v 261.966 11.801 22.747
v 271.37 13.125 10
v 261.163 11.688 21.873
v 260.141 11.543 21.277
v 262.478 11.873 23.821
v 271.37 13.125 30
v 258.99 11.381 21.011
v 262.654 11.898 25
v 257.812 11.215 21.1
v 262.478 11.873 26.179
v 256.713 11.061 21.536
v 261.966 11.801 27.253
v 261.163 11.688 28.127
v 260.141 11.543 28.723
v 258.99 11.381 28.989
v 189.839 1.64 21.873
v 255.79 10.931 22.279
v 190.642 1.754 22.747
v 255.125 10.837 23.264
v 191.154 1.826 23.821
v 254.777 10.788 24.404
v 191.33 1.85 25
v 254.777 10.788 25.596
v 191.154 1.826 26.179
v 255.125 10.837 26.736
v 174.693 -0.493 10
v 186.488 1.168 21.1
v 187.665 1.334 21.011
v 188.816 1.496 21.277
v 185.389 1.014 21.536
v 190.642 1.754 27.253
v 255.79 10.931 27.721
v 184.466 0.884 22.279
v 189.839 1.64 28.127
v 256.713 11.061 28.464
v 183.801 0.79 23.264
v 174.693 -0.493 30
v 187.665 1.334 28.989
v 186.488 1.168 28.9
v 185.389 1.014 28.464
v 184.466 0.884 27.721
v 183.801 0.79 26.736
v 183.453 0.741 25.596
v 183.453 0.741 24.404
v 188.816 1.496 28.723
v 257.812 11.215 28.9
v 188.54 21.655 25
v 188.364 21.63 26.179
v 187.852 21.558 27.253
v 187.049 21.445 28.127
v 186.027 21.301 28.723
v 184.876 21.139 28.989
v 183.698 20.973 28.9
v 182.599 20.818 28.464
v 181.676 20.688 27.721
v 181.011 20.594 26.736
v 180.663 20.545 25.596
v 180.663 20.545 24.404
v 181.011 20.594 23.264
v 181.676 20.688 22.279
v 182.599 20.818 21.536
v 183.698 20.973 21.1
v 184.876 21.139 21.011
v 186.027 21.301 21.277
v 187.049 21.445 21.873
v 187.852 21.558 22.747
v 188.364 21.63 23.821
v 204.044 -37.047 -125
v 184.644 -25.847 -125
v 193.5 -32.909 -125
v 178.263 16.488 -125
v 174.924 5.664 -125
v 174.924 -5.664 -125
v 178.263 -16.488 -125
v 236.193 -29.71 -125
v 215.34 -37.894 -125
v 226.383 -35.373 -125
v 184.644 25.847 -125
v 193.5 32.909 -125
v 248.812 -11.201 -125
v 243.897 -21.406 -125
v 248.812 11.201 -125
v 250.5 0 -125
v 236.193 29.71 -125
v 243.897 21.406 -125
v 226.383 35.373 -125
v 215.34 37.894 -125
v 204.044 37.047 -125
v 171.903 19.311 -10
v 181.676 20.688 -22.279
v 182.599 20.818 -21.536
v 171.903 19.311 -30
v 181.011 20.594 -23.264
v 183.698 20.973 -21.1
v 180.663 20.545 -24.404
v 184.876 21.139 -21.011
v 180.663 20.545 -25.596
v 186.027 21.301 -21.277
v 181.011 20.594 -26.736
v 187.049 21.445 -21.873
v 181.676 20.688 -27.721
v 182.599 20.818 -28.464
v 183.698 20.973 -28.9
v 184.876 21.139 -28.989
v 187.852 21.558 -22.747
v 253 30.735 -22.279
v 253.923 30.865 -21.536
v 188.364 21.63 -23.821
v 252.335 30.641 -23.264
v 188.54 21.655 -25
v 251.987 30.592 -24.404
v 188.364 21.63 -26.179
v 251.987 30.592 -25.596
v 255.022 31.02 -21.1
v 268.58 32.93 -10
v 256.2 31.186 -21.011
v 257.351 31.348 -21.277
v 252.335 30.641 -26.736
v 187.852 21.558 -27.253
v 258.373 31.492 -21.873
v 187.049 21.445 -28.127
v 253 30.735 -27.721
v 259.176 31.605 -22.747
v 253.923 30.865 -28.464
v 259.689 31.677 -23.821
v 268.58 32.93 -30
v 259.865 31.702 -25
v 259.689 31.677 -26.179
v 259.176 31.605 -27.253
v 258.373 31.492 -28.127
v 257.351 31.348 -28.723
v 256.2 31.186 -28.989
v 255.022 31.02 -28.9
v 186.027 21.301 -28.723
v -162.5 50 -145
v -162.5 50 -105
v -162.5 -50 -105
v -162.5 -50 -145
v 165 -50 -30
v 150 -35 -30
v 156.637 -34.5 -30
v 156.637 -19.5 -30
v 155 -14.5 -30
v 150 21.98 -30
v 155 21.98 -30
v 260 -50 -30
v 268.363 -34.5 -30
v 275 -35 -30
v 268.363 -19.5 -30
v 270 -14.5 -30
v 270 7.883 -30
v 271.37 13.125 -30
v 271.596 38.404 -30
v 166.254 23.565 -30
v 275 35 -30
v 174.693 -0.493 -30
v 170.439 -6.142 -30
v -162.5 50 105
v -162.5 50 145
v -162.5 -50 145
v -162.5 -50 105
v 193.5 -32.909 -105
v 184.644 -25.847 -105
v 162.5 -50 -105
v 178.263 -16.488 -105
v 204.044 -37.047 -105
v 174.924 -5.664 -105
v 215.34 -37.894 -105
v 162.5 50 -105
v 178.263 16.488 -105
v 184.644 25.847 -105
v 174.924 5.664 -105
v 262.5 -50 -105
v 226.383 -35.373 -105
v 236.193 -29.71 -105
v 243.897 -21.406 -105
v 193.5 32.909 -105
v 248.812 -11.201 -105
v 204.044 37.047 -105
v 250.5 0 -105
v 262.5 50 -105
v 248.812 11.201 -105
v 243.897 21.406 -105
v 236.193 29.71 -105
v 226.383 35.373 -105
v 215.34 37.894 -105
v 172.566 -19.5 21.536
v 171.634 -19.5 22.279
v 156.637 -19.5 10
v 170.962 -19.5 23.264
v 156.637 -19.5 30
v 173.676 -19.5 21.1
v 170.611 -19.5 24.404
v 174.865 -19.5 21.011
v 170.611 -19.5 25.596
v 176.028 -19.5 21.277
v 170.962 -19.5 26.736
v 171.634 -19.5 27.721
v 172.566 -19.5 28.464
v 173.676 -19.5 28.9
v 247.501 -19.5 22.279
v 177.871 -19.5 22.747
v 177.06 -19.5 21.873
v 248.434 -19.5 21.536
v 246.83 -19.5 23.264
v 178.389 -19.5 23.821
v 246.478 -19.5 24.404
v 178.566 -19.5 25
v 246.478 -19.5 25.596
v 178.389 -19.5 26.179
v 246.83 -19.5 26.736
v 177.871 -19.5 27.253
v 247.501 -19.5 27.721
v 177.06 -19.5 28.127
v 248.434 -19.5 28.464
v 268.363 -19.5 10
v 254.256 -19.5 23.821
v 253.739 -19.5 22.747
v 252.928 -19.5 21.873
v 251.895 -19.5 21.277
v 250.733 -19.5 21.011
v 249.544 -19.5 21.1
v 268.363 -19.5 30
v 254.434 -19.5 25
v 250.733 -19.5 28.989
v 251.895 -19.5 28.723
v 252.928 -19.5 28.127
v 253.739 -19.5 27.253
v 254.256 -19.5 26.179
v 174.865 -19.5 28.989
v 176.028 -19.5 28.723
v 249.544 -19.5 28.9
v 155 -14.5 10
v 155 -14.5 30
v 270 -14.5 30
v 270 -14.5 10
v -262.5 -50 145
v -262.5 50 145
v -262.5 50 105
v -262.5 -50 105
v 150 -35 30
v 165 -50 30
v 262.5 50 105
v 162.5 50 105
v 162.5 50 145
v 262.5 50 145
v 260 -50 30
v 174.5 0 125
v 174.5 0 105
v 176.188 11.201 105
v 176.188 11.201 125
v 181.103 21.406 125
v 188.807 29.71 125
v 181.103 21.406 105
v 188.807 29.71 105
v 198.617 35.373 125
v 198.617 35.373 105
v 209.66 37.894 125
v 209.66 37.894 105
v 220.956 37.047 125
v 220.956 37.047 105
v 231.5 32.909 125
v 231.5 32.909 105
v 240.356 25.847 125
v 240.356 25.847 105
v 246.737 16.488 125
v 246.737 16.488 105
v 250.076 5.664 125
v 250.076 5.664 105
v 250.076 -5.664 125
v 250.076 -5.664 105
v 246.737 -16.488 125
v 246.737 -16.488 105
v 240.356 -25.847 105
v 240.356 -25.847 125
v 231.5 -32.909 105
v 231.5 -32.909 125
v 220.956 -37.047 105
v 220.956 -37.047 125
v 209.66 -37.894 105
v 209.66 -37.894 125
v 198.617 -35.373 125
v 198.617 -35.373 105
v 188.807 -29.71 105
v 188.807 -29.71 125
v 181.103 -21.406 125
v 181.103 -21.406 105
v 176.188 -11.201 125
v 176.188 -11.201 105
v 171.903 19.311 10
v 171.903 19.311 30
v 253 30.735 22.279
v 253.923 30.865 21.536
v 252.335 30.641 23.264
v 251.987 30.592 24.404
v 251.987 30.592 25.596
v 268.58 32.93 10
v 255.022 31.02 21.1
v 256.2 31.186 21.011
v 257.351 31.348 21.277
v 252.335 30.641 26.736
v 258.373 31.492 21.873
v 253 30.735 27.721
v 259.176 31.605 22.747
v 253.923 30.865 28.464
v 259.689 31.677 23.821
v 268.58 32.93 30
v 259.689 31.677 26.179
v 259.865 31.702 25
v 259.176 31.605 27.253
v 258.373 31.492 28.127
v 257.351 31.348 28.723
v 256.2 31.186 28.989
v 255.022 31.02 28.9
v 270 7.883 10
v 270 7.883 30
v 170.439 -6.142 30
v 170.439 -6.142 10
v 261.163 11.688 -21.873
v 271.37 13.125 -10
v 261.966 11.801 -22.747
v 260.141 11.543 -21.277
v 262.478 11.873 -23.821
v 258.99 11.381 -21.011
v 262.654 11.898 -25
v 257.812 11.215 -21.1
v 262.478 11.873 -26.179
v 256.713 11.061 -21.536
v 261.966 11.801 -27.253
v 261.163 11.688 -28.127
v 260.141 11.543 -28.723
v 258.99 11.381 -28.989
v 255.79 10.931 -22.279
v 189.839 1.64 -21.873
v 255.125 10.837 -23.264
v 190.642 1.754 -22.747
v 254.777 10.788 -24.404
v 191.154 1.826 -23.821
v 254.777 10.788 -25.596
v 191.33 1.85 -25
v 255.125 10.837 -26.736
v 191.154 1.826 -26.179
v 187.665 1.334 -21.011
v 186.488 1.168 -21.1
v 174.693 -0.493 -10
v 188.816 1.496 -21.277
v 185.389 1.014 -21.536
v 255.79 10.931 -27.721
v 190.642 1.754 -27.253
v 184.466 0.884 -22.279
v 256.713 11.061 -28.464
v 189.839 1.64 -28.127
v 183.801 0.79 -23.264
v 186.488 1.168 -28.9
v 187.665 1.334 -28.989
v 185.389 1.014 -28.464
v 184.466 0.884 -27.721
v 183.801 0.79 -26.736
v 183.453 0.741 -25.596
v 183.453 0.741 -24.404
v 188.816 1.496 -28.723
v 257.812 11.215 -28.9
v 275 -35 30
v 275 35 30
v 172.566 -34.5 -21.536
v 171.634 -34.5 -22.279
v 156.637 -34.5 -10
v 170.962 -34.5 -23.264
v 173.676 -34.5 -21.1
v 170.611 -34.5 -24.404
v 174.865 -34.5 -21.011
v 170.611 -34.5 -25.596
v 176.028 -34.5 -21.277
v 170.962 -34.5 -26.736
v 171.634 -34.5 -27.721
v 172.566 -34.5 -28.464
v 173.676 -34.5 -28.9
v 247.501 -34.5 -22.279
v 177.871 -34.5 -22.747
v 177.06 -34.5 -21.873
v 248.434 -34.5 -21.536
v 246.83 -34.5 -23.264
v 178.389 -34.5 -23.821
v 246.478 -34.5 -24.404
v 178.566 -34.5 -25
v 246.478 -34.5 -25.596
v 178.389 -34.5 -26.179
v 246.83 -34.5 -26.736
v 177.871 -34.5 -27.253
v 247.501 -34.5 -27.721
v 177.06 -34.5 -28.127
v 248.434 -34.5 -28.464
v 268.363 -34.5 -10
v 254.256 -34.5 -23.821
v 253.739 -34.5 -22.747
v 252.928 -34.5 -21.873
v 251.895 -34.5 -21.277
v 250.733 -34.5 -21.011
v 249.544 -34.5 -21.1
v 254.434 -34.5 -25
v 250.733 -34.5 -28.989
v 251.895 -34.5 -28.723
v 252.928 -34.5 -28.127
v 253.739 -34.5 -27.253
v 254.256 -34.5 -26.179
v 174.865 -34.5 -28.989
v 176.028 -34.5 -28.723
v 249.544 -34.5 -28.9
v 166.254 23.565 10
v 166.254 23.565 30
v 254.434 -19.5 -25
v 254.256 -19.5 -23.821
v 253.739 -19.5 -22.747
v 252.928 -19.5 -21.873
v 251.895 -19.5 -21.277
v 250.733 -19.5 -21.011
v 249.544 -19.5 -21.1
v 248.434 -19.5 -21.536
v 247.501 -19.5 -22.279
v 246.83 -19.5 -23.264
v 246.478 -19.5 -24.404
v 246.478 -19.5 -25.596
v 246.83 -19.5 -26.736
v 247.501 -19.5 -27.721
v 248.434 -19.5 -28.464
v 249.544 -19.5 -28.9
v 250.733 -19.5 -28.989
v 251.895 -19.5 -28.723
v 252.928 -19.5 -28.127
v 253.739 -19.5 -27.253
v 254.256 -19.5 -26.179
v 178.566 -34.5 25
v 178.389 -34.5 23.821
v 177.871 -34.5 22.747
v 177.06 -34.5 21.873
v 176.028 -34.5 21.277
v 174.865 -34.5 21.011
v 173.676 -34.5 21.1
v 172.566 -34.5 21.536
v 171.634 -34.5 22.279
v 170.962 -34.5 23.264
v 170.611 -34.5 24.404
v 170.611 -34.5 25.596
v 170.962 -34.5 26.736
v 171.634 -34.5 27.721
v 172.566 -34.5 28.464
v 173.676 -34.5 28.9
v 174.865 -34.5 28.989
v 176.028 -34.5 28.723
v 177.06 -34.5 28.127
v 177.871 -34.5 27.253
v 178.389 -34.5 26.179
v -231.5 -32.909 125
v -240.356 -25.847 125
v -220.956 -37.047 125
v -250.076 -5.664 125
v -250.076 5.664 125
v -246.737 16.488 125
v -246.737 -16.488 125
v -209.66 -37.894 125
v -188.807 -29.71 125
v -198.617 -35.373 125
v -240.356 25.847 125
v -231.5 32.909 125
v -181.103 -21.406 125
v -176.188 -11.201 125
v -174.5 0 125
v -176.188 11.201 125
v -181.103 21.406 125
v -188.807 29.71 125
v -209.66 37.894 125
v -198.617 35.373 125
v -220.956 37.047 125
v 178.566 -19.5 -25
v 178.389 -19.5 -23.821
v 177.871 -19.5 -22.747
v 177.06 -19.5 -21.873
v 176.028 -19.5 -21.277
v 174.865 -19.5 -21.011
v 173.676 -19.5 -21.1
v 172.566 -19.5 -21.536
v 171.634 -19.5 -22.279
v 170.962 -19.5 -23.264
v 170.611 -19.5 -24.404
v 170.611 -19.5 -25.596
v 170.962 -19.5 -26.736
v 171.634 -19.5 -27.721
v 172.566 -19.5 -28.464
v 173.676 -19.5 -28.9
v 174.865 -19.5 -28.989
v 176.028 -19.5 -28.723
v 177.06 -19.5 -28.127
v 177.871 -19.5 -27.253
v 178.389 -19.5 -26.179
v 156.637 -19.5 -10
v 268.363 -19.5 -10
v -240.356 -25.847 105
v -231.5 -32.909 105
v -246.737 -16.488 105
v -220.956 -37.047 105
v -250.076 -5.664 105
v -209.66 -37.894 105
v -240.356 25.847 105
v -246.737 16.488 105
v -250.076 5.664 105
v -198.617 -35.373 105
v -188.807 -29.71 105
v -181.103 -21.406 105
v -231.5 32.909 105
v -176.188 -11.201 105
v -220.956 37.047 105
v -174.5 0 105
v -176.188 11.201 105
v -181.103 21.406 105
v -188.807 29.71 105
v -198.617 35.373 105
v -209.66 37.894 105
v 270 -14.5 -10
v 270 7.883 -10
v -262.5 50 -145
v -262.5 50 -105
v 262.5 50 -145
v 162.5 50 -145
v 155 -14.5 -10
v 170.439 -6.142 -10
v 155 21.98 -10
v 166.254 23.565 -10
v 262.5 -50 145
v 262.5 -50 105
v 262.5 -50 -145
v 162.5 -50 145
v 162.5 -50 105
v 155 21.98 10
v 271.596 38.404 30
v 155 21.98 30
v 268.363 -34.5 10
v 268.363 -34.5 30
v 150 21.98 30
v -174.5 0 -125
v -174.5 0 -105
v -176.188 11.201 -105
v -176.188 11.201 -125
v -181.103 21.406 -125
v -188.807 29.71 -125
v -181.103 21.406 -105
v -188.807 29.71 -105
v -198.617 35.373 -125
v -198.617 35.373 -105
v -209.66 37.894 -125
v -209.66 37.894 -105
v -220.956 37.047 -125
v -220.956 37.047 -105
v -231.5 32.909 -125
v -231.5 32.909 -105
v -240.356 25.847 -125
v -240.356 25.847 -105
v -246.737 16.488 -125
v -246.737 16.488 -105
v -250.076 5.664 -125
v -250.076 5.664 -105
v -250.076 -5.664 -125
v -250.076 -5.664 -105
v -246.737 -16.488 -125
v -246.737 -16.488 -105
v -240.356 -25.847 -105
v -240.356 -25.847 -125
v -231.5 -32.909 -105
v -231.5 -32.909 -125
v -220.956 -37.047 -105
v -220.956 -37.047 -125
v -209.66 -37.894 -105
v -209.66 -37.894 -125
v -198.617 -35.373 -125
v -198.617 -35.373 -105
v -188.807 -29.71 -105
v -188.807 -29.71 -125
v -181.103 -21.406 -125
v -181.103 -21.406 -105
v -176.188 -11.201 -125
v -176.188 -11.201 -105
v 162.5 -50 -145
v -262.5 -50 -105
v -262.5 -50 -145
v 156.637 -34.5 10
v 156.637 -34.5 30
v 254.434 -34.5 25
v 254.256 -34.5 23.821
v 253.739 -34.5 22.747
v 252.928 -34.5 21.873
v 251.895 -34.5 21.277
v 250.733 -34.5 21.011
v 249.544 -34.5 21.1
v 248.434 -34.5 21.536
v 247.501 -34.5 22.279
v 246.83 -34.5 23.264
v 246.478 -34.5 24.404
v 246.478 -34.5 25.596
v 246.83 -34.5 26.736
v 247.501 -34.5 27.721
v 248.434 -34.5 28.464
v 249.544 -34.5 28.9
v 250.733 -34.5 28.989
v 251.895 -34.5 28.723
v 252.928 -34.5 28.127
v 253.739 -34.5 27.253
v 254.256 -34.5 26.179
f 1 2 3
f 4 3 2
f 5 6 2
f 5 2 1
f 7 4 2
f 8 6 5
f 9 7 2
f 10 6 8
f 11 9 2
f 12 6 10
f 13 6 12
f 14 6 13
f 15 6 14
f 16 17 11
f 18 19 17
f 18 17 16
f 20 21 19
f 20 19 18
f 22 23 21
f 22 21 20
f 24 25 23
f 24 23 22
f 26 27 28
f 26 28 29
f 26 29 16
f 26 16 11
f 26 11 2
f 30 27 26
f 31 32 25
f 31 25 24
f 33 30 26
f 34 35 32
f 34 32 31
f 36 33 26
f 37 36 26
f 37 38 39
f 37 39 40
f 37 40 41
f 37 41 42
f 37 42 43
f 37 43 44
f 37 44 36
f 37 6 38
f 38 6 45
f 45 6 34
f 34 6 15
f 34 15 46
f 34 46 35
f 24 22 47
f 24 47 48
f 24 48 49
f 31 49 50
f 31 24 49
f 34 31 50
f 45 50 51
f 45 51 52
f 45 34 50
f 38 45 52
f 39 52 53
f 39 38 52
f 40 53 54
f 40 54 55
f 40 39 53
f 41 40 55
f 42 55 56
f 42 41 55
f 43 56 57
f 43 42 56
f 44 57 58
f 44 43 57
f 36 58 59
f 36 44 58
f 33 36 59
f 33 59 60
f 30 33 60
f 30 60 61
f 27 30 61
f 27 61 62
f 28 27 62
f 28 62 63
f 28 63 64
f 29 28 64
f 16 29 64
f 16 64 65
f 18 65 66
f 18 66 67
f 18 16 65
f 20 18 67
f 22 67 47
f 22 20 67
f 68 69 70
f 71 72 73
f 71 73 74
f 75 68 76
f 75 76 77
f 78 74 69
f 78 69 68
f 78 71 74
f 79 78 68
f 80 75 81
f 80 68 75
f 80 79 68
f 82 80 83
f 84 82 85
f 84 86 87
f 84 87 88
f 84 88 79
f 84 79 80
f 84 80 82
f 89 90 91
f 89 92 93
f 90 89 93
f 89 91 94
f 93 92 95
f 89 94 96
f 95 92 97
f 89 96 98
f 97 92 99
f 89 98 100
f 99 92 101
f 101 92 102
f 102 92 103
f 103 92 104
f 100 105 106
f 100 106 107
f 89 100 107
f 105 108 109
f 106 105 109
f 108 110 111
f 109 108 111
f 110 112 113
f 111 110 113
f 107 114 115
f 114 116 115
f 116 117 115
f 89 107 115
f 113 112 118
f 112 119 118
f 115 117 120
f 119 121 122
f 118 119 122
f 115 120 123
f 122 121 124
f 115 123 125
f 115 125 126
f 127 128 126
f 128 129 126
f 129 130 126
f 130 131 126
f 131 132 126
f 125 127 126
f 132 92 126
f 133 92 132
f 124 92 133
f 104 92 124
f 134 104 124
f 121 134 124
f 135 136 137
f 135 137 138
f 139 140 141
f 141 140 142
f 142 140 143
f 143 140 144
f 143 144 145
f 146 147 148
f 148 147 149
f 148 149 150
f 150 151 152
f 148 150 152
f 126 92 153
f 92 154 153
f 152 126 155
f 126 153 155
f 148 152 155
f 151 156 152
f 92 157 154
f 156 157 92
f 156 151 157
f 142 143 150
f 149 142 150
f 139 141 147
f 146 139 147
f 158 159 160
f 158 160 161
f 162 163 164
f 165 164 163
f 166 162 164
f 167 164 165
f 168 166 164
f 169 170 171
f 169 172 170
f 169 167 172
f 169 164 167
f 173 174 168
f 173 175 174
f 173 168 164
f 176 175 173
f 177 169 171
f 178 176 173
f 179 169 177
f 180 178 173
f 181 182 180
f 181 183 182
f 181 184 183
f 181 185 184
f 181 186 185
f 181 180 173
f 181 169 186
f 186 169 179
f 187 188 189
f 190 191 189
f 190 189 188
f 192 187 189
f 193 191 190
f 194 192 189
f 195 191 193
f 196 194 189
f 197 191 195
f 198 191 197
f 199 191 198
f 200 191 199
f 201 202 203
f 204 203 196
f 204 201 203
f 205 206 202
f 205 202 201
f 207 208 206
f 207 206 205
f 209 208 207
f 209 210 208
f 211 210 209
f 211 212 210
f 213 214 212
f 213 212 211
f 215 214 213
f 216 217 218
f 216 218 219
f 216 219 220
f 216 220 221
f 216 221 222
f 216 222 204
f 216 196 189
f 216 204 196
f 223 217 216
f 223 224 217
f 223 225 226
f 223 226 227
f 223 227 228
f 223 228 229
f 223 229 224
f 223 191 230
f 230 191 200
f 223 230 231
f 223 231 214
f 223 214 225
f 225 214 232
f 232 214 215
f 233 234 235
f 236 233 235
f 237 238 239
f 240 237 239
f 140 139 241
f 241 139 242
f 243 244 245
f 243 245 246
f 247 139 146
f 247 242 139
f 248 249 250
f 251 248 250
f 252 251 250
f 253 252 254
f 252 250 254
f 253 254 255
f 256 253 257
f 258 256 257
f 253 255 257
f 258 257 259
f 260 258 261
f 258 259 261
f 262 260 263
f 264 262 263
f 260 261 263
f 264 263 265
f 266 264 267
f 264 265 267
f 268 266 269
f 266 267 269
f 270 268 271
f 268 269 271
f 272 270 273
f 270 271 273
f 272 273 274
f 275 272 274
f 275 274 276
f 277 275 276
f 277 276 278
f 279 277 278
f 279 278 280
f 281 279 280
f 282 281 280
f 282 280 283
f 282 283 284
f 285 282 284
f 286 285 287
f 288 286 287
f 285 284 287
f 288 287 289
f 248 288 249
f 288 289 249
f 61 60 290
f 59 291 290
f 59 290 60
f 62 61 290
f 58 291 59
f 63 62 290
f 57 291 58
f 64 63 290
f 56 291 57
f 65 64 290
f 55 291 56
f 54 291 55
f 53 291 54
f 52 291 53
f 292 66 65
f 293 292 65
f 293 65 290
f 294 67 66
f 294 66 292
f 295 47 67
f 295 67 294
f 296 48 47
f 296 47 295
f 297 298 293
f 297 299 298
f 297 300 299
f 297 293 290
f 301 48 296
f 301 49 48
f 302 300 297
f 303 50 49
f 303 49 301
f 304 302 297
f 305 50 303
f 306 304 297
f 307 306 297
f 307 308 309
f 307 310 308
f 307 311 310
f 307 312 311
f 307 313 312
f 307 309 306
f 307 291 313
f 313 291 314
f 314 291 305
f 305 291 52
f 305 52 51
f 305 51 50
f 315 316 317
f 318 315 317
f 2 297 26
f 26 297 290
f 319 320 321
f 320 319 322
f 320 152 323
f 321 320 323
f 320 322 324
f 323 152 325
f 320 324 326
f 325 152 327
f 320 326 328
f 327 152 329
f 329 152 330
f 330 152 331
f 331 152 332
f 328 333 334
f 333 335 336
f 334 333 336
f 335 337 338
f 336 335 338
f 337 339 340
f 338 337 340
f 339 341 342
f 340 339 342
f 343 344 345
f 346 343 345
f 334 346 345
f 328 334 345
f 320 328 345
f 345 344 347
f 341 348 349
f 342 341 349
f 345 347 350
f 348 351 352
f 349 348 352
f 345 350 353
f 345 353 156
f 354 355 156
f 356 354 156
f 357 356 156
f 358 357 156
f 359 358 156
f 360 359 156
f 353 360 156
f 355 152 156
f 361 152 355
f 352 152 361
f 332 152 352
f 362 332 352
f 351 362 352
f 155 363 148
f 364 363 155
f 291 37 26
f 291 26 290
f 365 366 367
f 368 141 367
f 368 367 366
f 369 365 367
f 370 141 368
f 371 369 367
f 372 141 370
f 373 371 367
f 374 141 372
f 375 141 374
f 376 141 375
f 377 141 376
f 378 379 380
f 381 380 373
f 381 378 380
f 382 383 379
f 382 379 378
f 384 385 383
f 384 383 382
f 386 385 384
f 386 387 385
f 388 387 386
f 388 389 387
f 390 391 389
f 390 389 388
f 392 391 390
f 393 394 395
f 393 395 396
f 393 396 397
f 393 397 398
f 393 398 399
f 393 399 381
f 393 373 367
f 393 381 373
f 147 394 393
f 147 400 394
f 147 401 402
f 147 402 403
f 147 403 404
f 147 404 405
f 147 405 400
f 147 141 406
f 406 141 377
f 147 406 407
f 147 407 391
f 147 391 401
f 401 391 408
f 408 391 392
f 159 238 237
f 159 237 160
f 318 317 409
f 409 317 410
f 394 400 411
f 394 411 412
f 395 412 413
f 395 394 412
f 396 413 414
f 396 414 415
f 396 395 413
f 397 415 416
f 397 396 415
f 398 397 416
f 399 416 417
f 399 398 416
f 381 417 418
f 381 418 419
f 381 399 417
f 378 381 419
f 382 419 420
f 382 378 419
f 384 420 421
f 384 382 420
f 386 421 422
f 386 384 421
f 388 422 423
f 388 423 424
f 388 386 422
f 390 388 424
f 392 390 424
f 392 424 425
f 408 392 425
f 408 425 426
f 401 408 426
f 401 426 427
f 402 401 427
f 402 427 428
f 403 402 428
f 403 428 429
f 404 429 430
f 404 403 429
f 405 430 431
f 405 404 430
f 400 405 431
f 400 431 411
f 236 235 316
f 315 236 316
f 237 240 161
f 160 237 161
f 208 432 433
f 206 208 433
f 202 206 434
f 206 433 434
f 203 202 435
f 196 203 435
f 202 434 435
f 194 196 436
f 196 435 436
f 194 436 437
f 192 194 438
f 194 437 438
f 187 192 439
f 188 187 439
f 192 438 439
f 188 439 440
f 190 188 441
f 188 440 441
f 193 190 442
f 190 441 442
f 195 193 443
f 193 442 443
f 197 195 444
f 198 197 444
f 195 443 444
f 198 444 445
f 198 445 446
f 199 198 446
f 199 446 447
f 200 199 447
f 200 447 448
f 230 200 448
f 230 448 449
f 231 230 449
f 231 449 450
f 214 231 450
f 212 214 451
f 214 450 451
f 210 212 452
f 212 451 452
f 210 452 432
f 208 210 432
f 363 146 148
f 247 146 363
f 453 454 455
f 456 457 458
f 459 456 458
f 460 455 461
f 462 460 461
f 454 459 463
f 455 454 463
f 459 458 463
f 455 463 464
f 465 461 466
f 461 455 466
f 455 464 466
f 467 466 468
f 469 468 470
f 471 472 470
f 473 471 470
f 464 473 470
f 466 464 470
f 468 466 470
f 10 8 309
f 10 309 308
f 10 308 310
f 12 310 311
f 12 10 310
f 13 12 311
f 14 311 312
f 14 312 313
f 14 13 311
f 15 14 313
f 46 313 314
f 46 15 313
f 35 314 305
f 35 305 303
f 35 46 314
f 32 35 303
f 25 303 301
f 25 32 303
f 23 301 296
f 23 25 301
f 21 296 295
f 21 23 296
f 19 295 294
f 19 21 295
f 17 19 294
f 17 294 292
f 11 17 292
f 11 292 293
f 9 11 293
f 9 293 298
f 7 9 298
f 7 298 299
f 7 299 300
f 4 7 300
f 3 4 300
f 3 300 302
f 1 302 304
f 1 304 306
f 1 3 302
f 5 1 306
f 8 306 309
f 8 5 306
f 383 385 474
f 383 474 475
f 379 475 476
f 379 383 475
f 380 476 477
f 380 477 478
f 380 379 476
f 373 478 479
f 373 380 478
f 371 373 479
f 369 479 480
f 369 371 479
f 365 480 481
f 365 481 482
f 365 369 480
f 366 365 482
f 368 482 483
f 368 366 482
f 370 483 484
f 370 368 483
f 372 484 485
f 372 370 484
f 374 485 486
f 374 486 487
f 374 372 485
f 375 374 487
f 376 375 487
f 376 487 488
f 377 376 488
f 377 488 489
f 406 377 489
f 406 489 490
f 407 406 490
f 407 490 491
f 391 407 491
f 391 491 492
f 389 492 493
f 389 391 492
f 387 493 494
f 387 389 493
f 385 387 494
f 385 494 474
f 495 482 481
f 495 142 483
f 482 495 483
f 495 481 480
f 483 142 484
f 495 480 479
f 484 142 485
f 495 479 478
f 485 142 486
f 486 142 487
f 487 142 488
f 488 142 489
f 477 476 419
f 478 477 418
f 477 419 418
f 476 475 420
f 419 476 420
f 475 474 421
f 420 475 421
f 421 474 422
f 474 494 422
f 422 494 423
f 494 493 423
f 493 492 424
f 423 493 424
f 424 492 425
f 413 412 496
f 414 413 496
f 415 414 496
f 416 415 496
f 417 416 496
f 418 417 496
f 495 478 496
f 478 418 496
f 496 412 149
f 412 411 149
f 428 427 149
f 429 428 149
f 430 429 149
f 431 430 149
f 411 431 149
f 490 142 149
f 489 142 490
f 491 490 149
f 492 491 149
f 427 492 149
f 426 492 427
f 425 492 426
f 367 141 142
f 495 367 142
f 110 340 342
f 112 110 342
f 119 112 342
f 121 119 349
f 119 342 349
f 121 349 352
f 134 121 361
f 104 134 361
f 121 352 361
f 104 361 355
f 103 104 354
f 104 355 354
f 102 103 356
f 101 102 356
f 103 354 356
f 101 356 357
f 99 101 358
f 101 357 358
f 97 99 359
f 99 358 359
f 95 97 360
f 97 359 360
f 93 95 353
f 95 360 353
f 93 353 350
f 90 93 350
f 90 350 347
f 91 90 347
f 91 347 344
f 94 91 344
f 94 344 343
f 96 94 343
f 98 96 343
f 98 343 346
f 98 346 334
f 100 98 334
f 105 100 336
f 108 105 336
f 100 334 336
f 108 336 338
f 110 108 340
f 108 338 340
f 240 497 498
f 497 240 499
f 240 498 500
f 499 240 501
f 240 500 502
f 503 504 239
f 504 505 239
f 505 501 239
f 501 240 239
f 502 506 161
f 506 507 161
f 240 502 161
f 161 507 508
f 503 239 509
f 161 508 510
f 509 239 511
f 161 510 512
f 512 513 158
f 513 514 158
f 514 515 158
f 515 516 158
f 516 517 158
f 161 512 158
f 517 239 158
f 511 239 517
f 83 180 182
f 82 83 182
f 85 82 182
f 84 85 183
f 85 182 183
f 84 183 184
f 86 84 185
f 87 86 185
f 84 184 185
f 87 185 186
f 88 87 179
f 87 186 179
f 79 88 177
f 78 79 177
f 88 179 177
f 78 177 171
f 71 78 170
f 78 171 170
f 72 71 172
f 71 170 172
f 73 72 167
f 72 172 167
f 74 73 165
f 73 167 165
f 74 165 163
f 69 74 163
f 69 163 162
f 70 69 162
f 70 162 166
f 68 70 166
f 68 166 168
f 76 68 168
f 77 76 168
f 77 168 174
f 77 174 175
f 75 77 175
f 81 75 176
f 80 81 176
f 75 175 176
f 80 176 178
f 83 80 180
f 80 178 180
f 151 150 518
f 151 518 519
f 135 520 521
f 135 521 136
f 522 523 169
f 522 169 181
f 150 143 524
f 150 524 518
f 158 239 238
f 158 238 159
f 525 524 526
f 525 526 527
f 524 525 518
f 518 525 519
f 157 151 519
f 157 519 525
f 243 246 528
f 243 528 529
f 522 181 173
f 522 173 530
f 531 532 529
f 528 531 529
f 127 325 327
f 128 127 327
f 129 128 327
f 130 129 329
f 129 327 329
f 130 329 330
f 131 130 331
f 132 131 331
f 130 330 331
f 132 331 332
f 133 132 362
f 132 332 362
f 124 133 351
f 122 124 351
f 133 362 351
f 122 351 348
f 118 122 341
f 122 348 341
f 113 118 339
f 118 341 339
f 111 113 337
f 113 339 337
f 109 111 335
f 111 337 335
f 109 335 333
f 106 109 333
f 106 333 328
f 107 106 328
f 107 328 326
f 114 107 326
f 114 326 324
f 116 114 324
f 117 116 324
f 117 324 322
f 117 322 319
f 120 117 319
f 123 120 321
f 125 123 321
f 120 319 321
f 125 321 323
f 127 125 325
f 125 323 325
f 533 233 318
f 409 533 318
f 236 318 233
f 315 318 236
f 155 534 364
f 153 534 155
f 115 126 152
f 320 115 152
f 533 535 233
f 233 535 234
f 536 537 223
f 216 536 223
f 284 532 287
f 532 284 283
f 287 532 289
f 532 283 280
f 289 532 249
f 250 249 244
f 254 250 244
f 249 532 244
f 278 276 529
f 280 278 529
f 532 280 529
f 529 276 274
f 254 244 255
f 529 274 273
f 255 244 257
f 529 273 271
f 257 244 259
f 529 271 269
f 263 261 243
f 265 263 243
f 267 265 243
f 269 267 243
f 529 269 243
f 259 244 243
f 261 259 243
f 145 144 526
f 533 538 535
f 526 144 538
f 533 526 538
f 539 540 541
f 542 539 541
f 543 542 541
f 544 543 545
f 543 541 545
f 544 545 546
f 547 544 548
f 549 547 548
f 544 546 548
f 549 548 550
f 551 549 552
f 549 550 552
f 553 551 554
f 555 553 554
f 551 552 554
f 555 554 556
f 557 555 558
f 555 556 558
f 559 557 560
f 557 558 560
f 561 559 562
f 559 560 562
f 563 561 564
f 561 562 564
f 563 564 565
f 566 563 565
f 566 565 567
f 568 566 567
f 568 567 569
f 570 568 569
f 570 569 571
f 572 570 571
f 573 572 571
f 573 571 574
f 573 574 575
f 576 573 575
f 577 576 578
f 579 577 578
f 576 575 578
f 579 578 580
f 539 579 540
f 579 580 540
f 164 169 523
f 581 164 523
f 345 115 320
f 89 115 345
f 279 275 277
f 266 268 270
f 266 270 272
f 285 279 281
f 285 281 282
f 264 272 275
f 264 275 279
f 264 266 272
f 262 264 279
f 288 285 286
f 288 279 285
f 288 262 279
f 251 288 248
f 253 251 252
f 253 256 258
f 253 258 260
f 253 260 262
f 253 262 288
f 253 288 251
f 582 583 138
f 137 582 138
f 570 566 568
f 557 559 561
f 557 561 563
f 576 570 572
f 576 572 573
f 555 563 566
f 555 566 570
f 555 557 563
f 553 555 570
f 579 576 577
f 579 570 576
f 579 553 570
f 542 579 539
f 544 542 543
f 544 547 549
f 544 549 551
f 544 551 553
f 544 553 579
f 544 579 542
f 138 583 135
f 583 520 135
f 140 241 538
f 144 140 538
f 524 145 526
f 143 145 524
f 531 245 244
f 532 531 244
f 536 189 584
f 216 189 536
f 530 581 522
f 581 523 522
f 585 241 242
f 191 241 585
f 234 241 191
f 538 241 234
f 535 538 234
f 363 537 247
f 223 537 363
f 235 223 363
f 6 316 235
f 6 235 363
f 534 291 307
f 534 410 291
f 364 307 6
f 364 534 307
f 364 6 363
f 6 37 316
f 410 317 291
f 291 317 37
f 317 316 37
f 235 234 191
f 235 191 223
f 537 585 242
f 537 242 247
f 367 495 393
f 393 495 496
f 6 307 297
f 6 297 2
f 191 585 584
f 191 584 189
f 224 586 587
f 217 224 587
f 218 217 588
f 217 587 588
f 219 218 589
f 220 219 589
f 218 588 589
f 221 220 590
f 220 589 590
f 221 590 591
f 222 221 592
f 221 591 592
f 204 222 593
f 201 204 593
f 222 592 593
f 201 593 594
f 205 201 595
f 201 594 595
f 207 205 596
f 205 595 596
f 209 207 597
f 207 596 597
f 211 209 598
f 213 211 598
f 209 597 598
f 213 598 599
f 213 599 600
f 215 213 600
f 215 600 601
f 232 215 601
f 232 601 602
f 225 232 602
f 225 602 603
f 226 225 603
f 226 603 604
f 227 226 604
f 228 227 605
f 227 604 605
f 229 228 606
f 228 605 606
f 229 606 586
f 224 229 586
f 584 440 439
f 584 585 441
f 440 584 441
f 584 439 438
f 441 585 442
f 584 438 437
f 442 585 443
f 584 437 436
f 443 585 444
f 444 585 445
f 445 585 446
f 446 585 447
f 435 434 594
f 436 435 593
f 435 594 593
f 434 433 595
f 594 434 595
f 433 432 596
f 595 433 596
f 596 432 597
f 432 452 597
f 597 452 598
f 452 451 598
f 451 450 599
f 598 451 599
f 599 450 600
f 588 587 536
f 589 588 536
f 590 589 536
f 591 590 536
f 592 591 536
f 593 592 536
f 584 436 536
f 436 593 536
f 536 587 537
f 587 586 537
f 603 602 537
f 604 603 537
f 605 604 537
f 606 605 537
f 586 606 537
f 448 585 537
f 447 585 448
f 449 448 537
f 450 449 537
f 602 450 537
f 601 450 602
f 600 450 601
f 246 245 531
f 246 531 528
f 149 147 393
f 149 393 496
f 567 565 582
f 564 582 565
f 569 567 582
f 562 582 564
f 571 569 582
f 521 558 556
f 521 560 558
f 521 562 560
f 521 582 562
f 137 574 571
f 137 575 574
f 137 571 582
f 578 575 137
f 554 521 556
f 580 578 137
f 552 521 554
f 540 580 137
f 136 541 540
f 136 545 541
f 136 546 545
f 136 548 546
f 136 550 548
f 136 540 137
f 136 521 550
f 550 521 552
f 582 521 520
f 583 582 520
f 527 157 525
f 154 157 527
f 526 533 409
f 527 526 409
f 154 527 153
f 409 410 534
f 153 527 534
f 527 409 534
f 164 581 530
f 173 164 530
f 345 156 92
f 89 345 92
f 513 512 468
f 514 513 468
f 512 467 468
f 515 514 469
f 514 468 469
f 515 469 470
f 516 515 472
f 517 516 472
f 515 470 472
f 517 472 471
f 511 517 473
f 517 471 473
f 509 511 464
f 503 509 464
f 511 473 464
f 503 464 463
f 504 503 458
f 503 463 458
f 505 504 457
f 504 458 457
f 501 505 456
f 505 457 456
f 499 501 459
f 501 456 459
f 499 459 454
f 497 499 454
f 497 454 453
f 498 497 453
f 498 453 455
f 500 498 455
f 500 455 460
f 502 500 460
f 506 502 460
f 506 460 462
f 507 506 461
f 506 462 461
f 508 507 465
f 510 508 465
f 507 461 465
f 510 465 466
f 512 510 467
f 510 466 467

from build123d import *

# Parameters (mm, degrees)
SKETCH1_W                = 100
SKETCH1_H                = 40
BOSS_EXTRUDE1_DEPTH      = 50
BOSS_EXTRUDE1_2_DEPTH    = 50
BOSS_EXTRUDE1_3_DEPTH    = 50
BOSS_EXTRUDE1_4_DEPTH    = 50
SKETCH3_R                = 38
CUT_EXTRUDE5_DEPTH       = 20
SKETCH4_R                = 38
CUT_EXTRUDE6_DEPTH       = 20
SKETCH11_W               = 125
SKETCH11_H               = 100
BOSS_EXTRUDE3_DEPTH      = 30
CHAMFER1_SIZE            = 15
SKETCH17_W               = 111.72522046
SKETCH17_H               = 15
CUT_EXTRUDE8_DEPTH       = 20
SKETCH22_R               = 4
BOSS_EXTRUDE5_DEPTH      = 15
CUT_EXTRUDE9_DEPTH       = 20
SKETCH24_R               = 4
BOSS_EXTRUDE7_DEPTH      = 20
CUT_EXTRUDE12_DEPTH      = 60
CUT_EXTRUDE13_DEPTH      = 20
SKETCH29_R               = 38
CUT_EXTRUDE14_DEPTH      = 230
CUT_EXTRUDE14_DEPTH_BACK = 20


with BuildPart() as part:
    # Sketch1 → Boss-Extrude1 (new body, symmetric)
    with BuildSketch(Plane(origin=(0, 0, 0), x_dir=(1, 0, 0), z_dir=(0, 1, 0))):
        with Locations((212.5, 125)):
            Rectangle(SKETCH1_W, SKETCH1_H)
    extrude(amount=BOSS_EXTRUDE1_DEPTH, both=True)

    # Sketch4 → Cut-Extrude6 (cut)
    with BuildSketch(Plane.XY.offset(-105)):
        with Locations((212.5, 0)):
            Circle(SKETCH4_R)
    extrude(amount=-CUT_EXTRUDE6_DEPTH, mode=Mode.SUBTRACT)


with BuildPart() as body_2:
    # Sketch1 → Boss-Extrude1 2 (new body, symmetric)
    with BuildSketch(Plane(origin=(0, 0, 0), x_dir=(1, 0, 0), z_dir=(0, 1, 0))):
        with Locations((212.5, -125)):
            Rectangle(SKETCH1_W, SKETCH1_H)
    extrude(amount=BOSS_EXTRUDE1_2_DEPTH, both=True)

    # Sketch3 → Cut-Extrude5 (cut)
    with BuildSketch(Plane(origin=(0, 0, 105), x_dir=(-1, 0, 0), z_dir=(0, 0, -1))):
        with Locations((-212.5, 0)):
            Circle(SKETCH3_R)
    extrude(amount=-CUT_EXTRUDE5_DEPTH, mode=Mode.SUBTRACT)


with BuildPart() as body_3:
    # Sketch1 → Boss-Extrude1 3 (new body, symmetric)
    with BuildSketch(Plane(origin=(0, 0, 0), x_dir=(1, 0, 0), z_dir=(0, 1, 0))):
        with Locations((-212.5, -125)):
            Rectangle(SKETCH1_W, SKETCH1_H)
    extrude(amount=BOSS_EXTRUDE1_3_DEPTH, both=True)


with BuildPart() as body_4:
    # Sketch1 → Boss-Extrude1 4 (new body, symmetric)
    with BuildSketch(Plane(origin=(0, 0, 0), x_dir=(1, 0, 0), z_dir=(0, 1, 0))):
        with Locations((-212.5, 125)):
            Rectangle(SKETCH1_W, SKETCH1_H)
    extrude(amount=BOSS_EXTRUDE1_4_DEPTH, both=True)


with BuildPart() as body_5:
    # Sketch11 → Boss-Extrude3 (new body, symmetric)
    with BuildSketch(Plane.XY):
        with Locations((212.5, 0)):
            Rectangle(SKETCH11_W, SKETCH11_H)
    extrude(amount=BOSS_EXTRUDE3_DEPTH, both=True)

    # Chamfer1
    chamfer1_edges = [body_5.edges().sort_by_distance(p)[0] for p in [
        (275, 50, 0),
        (275, -50, 0),
        (150, -50, 0),
        (150, 50, 0),
    ]]
    chamfer(chamfer1_edges, length=CHAMFER1_SIZE)

    # Sketch17 → Cut-Extrude8 (cut)
    with BuildSketch(Plane.XY.offset(30)):
        with Locations((212.5, -27)):
            Rectangle(SKETCH17_W, SKETCH17_H)
    cut_extrude8 = extrude(amount=-CUT_EXTRUDE8_DEPTH, mode=Mode.SUBTRACT)

    # Sketch22 → Boss-Extrude5 (add)
    with BuildSketch(Plane(origin=(0, -34.5, 0), x_dir=(1, 0, 0), z_dir=(0, 1, 0))):
        with Locations((174.566321958, -25)):
            Circle(SKETCH22_R)
        with Locations((250.433678042, -25)):
            Circle(SKETCH22_R)
    boss_extrude5 = extrude(amount=BOSS_EXTRUDE5_DEPTH)

    # Mirror4: Cut-Extrude8, Boss-Extrude5 across plane
    add(cut_extrude8.mirror(Plane.XY), mode=Mode.SUBTRACT)
    add(boss_extrude5.mirror(Plane.XY))

    # Sketch14 → Cut-Extrude9 (cut)
    with BuildSketch(Plane(origin=(0, 0, -30), x_dir=(-1, 0, 0), z_dir=(0, 0, -1))):
        Polygon((-268.580387406, 32.929801142), (-271.370152896, 13.125326686), (-174.692702514, -0.49318237), (-171.902937024, 19.311292087), align=None)
    cut_extrude9 = extrude(amount=-CUT_EXTRUDE9_DEPTH, mode=Mode.SUBTRACT)

    # Sketch24 → Boss-Extrude7 (add)
    with BuildSketch(Plane(origin=(3.467112812, -24.61294592, 0), x_dir=(0.990223723, 0.139488274, 0), z_dir=(-0.139488274, 0.990223723, 0))):
        with Locations((257.746246584, 25)):
            Circle(SKETCH24_R)
        with Locations((185.717810735, 25)):
            Circle(SKETCH24_R)
    boss_extrude7 = extrude(amount=BOSS_EXTRUDE7_DEPTH)

    # Mirror5: Cut-Extrude9, Boss-Extrude7 across plane
    add(cut_extrude9.mirror(Plane.XY), mode=Mode.SUBTRACT)
    add(boss_extrude7.mirror(Plane.XY))

    # Sketch27 → Cut-Extrude12 (cut)
    with BuildSketch(Plane.XY.offset(30)):
        Polygon((150, 21.97961685), (155, 21.97961685), (271.5960345, 38.4039655), (260, 50), (165, 50), (150, 35), align=None)
    extrude(amount=-CUT_EXTRUDE12_DEPTH, mode=Mode.SUBTRACT)

    # Sketch28 → Cut-Extrude13 (cut)
    with BuildSketch(Plane.XY.offset(30)):
        Polygon((155, -14.5), (270, -14.5), (270, 7.882955549), (170.439025272, -6.141742357), (166.254377038, 23.564969329), (155, 21.97961685), align=None)
    cut_extrude13 = extrude(amount=-CUT_EXTRUDE13_DEPTH, mode=Mode.SUBTRACT)

    # Mirror6: Cut-Extrude13 across plane
    add(cut_extrude13.mirror(Plane.XY), mode=Mode.SUBTRACT)


with BuildPart() as cut_extrude14_tool:
    # Sketch29 → Cut-Extrude14 (new body, two sides)
    with BuildSketch(Plane.XY.offset(-105)) as cut_extrude14_sk:
        with Locations((-212.5, 0)):
            Circle(SKETCH29_R)
    extrude(amount=CUT_EXTRUDE14_DEPTH)
    extrude(cut_extrude14_sk.sketch, amount=-CUT_EXTRUDE14_DEPTH_BACK)


with BuildPart() as body_3_1:
    add(body_3.part)

    # Cut-Extrude14: cut by cut_extrude14_tool
    add(cut_extrude14_tool.part, mode=Mode.SUBTRACT)


with BuildPart() as body_4_1:
    add(body_4.part)

    # Cut-Extrude14: cut by cut_extrude14_tool
    add(cut_extrude14_tool.part, mode=Mode.SUBTRACT)


solid = Compound([part.part, body_2.part, body_5.part, body_3_1.part, body_4_1.part])
